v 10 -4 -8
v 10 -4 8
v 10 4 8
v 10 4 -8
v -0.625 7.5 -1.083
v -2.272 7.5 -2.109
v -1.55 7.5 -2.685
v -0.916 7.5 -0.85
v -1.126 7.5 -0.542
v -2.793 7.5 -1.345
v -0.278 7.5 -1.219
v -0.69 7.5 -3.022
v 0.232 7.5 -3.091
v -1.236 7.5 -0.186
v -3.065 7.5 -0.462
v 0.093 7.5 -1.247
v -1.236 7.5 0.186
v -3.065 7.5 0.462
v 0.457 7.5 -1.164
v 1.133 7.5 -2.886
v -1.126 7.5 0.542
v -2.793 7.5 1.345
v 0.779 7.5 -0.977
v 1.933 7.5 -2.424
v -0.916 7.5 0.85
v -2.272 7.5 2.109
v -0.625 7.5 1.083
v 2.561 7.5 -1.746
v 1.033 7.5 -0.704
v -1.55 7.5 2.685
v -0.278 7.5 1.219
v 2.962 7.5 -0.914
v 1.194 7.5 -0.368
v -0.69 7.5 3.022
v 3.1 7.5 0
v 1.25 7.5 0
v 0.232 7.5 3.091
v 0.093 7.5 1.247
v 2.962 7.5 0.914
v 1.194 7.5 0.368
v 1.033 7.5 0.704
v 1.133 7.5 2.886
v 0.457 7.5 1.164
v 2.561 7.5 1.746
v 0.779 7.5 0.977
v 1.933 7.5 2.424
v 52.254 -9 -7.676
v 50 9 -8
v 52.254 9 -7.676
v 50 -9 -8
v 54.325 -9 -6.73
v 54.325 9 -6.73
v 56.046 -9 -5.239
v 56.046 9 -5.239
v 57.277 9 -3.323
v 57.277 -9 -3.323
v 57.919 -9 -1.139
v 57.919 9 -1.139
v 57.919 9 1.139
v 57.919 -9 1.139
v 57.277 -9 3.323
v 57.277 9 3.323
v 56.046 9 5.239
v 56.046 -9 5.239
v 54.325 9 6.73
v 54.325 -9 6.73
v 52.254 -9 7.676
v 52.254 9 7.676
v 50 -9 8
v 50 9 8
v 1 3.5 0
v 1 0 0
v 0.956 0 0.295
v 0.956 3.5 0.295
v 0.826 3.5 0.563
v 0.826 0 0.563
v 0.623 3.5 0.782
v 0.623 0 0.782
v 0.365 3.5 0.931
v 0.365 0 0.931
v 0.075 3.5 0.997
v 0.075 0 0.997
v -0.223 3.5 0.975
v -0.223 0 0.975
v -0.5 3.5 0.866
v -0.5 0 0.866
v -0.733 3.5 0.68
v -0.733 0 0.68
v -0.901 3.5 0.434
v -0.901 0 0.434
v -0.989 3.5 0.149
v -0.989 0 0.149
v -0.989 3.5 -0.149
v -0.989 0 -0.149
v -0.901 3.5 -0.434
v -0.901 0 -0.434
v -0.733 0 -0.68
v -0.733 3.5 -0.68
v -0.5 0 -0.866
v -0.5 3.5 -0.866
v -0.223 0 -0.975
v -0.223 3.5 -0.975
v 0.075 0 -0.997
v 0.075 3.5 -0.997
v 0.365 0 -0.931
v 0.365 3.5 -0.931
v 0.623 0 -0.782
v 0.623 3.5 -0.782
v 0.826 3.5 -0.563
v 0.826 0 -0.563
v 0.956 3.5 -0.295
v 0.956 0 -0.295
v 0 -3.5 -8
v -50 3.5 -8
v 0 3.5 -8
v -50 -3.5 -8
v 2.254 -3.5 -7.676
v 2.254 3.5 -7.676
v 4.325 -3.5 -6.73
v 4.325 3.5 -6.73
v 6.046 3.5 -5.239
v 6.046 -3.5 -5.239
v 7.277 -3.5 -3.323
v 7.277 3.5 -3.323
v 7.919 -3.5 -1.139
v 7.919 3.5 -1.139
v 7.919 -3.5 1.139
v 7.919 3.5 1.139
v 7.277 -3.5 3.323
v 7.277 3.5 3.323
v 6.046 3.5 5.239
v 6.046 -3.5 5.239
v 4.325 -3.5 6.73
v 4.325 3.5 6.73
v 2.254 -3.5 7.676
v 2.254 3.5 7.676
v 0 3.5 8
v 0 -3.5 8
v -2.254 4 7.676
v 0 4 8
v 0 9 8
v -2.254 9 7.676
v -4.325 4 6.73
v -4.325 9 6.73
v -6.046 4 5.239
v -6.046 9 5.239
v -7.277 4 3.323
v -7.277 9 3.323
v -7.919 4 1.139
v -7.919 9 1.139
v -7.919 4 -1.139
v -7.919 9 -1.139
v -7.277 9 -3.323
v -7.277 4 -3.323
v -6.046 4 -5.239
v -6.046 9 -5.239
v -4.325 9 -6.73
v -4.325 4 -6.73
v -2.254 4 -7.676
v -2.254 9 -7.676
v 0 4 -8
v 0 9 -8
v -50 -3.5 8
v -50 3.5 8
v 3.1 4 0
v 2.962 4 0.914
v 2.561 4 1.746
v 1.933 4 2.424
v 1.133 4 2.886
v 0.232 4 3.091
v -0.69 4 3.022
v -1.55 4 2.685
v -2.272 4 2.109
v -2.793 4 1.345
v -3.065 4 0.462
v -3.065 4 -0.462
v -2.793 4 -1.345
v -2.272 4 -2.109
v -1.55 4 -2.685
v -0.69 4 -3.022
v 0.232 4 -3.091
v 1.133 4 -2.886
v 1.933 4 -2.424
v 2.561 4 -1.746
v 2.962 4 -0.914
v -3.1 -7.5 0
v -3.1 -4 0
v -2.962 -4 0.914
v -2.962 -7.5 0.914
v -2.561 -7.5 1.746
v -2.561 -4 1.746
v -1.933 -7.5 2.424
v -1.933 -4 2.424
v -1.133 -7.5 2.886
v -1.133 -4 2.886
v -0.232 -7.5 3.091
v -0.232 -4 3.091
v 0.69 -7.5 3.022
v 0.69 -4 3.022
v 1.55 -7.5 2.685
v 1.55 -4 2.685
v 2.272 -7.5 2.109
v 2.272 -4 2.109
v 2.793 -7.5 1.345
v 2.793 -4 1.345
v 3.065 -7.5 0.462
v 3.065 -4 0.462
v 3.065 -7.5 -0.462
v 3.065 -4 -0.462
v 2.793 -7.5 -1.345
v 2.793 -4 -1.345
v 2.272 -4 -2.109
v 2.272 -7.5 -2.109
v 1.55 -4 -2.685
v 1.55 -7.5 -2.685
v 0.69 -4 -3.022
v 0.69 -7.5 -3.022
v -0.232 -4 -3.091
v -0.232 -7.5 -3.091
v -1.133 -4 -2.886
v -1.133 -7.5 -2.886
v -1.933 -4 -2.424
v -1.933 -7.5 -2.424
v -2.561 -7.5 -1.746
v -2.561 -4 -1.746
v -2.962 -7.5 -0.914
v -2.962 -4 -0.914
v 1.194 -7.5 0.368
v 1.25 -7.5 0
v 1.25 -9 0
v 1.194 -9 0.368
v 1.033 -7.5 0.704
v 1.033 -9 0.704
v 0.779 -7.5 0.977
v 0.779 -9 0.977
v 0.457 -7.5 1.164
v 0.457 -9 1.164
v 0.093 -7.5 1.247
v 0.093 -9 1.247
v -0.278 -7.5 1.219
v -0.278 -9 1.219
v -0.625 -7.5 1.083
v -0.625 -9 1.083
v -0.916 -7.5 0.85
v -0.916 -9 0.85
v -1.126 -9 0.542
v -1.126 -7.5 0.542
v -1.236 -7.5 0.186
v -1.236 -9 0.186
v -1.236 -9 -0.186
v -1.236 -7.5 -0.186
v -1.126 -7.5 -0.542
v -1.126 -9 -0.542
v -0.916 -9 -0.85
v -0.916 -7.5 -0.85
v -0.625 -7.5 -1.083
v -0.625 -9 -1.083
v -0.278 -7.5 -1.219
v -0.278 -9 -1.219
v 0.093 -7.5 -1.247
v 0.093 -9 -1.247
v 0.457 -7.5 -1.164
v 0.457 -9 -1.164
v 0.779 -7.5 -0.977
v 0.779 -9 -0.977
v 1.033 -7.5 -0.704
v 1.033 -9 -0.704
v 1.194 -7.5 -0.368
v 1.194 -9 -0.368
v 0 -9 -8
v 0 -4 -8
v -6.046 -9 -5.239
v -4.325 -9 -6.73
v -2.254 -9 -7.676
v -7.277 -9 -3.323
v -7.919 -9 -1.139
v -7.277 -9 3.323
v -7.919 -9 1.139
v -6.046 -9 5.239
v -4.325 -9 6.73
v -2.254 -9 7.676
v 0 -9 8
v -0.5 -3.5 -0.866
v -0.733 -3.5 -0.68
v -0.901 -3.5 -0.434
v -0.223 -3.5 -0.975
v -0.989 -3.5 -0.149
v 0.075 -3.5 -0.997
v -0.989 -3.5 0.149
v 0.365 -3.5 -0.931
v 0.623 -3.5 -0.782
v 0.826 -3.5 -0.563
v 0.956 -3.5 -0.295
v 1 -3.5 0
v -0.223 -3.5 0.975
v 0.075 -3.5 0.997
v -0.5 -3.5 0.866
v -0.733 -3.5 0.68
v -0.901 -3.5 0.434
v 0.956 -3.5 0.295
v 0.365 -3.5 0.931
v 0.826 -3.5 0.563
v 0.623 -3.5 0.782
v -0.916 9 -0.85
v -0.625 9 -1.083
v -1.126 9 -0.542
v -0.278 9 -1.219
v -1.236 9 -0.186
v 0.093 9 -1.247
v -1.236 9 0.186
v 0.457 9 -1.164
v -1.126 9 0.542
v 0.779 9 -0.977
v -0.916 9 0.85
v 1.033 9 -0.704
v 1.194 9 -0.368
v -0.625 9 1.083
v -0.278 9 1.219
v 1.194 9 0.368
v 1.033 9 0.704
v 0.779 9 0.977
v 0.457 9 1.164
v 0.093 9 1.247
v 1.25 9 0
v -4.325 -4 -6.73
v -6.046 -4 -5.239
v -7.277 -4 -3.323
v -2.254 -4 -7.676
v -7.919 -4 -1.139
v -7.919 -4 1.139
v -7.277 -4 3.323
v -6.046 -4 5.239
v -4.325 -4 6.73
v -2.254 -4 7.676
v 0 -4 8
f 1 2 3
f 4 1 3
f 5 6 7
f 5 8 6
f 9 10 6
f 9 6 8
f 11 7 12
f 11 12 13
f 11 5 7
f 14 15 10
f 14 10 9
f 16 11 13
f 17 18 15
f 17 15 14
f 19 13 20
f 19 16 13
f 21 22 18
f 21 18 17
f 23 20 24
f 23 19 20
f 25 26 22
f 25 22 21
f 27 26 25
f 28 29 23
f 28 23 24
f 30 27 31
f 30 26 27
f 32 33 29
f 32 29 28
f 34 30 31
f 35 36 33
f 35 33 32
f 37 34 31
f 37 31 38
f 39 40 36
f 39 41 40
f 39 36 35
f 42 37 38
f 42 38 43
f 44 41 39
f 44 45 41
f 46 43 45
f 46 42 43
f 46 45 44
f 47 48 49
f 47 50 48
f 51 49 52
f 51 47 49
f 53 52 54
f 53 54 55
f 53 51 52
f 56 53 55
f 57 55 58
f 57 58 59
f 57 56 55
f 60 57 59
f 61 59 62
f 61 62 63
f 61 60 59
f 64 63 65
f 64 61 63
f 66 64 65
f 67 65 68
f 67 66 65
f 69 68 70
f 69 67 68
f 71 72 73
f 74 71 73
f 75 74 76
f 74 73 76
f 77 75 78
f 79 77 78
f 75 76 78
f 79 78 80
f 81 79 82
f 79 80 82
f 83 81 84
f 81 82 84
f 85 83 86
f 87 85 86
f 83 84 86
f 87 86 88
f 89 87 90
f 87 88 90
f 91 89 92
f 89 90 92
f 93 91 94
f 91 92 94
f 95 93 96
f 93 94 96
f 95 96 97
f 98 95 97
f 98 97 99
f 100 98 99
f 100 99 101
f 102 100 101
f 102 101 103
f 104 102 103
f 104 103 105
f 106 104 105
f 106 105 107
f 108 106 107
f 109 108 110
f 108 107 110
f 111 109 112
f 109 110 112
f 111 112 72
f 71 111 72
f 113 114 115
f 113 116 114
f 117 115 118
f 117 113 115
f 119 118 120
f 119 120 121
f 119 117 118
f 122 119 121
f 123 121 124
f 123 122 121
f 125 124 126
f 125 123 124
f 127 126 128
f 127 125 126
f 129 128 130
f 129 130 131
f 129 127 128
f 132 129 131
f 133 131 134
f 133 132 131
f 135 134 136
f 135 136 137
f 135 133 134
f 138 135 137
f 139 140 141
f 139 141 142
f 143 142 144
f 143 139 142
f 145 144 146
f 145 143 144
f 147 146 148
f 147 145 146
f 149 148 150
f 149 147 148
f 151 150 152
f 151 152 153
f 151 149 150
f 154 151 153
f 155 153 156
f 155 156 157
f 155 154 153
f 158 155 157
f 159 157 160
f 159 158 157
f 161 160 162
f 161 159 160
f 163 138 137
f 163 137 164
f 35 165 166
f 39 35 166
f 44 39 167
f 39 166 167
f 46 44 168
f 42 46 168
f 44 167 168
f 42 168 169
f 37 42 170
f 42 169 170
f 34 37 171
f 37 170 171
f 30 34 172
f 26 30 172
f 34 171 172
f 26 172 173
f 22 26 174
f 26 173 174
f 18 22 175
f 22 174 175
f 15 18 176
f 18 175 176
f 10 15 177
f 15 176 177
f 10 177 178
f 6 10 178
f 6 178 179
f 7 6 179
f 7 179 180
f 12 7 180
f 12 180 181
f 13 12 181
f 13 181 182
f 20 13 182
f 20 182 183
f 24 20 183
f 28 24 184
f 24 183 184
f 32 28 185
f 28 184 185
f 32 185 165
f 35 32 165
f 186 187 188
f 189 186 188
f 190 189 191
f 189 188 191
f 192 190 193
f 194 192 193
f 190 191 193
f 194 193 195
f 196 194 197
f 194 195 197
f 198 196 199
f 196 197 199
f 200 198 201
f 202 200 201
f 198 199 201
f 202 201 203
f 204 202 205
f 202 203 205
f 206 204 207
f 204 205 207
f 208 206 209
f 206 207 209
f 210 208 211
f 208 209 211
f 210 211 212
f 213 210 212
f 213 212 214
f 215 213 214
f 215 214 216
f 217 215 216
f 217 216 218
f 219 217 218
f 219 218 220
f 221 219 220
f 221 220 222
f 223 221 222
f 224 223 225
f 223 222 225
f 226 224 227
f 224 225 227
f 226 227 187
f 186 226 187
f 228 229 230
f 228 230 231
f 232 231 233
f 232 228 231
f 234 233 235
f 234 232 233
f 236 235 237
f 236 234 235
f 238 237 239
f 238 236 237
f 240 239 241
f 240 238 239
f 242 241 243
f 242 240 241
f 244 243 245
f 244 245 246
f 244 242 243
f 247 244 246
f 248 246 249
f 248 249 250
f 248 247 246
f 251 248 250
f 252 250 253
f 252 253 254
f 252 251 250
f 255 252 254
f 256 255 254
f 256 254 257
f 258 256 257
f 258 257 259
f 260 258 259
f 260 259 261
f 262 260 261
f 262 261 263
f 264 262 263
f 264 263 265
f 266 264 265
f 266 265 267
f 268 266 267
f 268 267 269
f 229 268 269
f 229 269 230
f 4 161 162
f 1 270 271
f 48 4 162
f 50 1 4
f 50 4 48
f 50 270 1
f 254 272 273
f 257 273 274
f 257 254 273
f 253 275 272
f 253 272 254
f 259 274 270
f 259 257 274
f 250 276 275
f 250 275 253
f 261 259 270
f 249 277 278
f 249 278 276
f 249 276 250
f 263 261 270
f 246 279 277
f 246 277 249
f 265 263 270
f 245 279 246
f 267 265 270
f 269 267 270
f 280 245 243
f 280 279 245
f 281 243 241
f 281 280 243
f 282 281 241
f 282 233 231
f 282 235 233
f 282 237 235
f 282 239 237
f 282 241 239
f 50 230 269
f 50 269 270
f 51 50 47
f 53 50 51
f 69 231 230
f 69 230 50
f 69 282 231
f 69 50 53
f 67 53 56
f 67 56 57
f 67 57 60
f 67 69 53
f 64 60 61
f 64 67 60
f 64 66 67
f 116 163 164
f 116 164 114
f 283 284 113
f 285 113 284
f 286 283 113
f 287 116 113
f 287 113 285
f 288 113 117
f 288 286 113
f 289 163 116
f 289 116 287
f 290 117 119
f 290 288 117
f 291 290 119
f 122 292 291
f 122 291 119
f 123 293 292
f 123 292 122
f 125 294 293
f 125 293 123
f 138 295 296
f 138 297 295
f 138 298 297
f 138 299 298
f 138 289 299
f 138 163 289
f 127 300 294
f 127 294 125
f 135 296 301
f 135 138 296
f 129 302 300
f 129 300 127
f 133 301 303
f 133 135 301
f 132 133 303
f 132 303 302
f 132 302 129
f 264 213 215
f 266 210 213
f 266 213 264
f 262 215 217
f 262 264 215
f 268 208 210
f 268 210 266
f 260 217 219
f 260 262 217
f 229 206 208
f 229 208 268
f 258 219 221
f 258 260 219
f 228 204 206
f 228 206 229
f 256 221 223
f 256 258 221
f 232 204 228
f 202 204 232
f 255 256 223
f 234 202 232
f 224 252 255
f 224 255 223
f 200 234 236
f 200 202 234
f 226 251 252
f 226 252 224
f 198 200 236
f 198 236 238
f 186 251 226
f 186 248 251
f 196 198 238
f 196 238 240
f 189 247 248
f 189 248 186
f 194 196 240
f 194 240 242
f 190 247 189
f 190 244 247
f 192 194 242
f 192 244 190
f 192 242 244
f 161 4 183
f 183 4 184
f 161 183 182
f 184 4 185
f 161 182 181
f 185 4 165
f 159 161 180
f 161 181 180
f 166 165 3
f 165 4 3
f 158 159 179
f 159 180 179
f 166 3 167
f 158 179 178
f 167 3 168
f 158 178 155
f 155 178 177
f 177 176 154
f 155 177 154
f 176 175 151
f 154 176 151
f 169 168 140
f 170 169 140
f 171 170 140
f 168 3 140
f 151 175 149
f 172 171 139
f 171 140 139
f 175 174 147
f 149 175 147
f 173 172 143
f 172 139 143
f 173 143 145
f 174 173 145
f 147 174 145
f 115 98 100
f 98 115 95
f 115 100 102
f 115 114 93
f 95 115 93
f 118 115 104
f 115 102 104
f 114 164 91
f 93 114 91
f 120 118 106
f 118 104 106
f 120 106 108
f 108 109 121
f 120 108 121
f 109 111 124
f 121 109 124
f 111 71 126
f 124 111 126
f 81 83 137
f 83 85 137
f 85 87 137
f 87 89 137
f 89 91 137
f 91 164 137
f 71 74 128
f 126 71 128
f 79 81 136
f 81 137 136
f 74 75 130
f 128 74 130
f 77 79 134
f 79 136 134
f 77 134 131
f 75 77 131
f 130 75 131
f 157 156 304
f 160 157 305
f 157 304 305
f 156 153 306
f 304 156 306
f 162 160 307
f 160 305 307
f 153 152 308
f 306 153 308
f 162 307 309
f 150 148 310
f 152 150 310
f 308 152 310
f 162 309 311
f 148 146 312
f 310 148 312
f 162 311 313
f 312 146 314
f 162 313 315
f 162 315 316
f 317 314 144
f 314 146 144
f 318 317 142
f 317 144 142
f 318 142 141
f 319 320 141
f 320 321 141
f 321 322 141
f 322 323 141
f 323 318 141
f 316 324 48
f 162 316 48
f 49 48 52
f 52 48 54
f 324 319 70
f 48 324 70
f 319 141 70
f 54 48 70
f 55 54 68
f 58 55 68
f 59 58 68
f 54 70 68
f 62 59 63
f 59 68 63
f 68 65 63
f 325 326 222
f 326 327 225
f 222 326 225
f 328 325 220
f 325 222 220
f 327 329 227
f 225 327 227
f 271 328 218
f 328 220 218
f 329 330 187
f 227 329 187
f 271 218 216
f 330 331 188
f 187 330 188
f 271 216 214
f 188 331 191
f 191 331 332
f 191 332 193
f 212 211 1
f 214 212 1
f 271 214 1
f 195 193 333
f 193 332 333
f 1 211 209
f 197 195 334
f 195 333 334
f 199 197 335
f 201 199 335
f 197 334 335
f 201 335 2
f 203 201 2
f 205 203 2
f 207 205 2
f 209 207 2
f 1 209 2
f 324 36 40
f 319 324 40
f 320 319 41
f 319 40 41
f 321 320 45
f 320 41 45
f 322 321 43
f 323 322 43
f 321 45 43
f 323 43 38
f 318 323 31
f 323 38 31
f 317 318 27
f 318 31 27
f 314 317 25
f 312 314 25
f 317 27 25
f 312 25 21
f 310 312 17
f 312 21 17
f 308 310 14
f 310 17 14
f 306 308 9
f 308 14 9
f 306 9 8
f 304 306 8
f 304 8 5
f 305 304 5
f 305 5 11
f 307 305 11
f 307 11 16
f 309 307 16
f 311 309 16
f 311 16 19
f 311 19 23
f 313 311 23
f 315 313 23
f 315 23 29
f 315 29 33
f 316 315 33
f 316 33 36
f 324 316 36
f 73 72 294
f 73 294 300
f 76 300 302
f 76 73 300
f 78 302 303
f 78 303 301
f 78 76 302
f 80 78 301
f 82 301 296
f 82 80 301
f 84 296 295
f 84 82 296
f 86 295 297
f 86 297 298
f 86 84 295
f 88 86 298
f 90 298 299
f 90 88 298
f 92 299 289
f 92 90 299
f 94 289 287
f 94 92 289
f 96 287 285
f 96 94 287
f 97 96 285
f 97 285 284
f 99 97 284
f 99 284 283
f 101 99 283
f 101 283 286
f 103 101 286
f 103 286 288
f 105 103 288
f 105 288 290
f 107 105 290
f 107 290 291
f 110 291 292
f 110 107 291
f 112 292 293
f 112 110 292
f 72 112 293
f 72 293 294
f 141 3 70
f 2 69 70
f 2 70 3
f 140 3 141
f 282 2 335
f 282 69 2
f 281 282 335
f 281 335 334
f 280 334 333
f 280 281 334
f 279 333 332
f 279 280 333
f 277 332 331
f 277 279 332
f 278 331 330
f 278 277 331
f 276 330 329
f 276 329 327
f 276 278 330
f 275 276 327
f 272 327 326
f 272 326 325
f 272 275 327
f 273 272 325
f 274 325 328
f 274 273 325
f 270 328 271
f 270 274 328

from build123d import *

# Parameters (mm, degrees)
F0_R          = 1.25
F1_DEPTH      = 9
F1_DEPTH_BACK = 9
F3_DEPTH      = 16
F4_R          = 3.1
F4_R_2        = 1.25
F5_DEPTH      = 3.5
F6_R          = 3.1
F7_DEPTH      = 3.5
F8_R          = 1
F9_DEPTH      = 3.5
F9_DEPTH_BACK = 3.5


with BuildPart() as f1:
    # F0 (on Front) → F1 (new body, two sides)
    with BuildSketch(Plane.XZ) as f1_sk:
        with BuildLine():
            Line((50, 8), (0, 8))
            ThreePointArc((0, 8), (-8, 0), (0, -8))
            Line((0, -8), (50, -8))
            ThreePointArc((50, -8), (58, 0), (50, 8))
        make_face()
        Circle(F0_R, mode=Mode.SUBTRACT)
    extrude(amount=F1_DEPTH)
    extrude(f1_sk.sketch, amount=-F1_DEPTH_BACK)

    # F2 (on face) → F3 (cut, through all)
    with BuildSketch(Plane.XY.offset(8)):
        Polygon((-8, 0), (-8, -4), (0, -4), (0, 4), (-8, 4), align=None)
        Polygon((0, 4), (0, -4), (10, -4), (10, 0), (10, 4), align=None)
    extrude(amount=-F3_DEPTH, mode=Mode.SUBTRACT)

    # F4 (on face) → F5 (cut)
    with BuildSketch(Plane(origin=(0, -4, 0), x_dir=(-1, 0, 0), z_dir=(0, 1, 0))):
        Circle(F4_R)
        Circle(F4_R_2, mode=Mode.SUBTRACT)
    extrude(amount=-F5_DEPTH, mode=Mode.SUBTRACT)

    # F6 (on face) → F7 (cut)
    with BuildSketch(Plane.XZ.offset(-4)):
        Circle(F6_R)
    extrude(amount=-F7_DEPTH, mode=Mode.SUBTRACT)


with BuildPart() as f9:
    # F8 (on Front) → F9 (new body, two sides)
    with BuildSketch(Plane.XZ) as f9_sk:
        with BuildLine():
            ThreePointArc((0, -8), (8, 0), (0, 8))
            Line((0, 8), (-50, 8))
            Line((-50, 8), (-50, -8))
            Line((-50, -8), (0, -8))
        make_face()
        Circle(F8_R, mode=Mode.SUBTRACT)
    extrude(amount=F9_DEPTH)
    extrude(f9_sk.sketch, amount=-F9_DEPTH_BACK)


solid = Compound([f1.part, f9.part])
